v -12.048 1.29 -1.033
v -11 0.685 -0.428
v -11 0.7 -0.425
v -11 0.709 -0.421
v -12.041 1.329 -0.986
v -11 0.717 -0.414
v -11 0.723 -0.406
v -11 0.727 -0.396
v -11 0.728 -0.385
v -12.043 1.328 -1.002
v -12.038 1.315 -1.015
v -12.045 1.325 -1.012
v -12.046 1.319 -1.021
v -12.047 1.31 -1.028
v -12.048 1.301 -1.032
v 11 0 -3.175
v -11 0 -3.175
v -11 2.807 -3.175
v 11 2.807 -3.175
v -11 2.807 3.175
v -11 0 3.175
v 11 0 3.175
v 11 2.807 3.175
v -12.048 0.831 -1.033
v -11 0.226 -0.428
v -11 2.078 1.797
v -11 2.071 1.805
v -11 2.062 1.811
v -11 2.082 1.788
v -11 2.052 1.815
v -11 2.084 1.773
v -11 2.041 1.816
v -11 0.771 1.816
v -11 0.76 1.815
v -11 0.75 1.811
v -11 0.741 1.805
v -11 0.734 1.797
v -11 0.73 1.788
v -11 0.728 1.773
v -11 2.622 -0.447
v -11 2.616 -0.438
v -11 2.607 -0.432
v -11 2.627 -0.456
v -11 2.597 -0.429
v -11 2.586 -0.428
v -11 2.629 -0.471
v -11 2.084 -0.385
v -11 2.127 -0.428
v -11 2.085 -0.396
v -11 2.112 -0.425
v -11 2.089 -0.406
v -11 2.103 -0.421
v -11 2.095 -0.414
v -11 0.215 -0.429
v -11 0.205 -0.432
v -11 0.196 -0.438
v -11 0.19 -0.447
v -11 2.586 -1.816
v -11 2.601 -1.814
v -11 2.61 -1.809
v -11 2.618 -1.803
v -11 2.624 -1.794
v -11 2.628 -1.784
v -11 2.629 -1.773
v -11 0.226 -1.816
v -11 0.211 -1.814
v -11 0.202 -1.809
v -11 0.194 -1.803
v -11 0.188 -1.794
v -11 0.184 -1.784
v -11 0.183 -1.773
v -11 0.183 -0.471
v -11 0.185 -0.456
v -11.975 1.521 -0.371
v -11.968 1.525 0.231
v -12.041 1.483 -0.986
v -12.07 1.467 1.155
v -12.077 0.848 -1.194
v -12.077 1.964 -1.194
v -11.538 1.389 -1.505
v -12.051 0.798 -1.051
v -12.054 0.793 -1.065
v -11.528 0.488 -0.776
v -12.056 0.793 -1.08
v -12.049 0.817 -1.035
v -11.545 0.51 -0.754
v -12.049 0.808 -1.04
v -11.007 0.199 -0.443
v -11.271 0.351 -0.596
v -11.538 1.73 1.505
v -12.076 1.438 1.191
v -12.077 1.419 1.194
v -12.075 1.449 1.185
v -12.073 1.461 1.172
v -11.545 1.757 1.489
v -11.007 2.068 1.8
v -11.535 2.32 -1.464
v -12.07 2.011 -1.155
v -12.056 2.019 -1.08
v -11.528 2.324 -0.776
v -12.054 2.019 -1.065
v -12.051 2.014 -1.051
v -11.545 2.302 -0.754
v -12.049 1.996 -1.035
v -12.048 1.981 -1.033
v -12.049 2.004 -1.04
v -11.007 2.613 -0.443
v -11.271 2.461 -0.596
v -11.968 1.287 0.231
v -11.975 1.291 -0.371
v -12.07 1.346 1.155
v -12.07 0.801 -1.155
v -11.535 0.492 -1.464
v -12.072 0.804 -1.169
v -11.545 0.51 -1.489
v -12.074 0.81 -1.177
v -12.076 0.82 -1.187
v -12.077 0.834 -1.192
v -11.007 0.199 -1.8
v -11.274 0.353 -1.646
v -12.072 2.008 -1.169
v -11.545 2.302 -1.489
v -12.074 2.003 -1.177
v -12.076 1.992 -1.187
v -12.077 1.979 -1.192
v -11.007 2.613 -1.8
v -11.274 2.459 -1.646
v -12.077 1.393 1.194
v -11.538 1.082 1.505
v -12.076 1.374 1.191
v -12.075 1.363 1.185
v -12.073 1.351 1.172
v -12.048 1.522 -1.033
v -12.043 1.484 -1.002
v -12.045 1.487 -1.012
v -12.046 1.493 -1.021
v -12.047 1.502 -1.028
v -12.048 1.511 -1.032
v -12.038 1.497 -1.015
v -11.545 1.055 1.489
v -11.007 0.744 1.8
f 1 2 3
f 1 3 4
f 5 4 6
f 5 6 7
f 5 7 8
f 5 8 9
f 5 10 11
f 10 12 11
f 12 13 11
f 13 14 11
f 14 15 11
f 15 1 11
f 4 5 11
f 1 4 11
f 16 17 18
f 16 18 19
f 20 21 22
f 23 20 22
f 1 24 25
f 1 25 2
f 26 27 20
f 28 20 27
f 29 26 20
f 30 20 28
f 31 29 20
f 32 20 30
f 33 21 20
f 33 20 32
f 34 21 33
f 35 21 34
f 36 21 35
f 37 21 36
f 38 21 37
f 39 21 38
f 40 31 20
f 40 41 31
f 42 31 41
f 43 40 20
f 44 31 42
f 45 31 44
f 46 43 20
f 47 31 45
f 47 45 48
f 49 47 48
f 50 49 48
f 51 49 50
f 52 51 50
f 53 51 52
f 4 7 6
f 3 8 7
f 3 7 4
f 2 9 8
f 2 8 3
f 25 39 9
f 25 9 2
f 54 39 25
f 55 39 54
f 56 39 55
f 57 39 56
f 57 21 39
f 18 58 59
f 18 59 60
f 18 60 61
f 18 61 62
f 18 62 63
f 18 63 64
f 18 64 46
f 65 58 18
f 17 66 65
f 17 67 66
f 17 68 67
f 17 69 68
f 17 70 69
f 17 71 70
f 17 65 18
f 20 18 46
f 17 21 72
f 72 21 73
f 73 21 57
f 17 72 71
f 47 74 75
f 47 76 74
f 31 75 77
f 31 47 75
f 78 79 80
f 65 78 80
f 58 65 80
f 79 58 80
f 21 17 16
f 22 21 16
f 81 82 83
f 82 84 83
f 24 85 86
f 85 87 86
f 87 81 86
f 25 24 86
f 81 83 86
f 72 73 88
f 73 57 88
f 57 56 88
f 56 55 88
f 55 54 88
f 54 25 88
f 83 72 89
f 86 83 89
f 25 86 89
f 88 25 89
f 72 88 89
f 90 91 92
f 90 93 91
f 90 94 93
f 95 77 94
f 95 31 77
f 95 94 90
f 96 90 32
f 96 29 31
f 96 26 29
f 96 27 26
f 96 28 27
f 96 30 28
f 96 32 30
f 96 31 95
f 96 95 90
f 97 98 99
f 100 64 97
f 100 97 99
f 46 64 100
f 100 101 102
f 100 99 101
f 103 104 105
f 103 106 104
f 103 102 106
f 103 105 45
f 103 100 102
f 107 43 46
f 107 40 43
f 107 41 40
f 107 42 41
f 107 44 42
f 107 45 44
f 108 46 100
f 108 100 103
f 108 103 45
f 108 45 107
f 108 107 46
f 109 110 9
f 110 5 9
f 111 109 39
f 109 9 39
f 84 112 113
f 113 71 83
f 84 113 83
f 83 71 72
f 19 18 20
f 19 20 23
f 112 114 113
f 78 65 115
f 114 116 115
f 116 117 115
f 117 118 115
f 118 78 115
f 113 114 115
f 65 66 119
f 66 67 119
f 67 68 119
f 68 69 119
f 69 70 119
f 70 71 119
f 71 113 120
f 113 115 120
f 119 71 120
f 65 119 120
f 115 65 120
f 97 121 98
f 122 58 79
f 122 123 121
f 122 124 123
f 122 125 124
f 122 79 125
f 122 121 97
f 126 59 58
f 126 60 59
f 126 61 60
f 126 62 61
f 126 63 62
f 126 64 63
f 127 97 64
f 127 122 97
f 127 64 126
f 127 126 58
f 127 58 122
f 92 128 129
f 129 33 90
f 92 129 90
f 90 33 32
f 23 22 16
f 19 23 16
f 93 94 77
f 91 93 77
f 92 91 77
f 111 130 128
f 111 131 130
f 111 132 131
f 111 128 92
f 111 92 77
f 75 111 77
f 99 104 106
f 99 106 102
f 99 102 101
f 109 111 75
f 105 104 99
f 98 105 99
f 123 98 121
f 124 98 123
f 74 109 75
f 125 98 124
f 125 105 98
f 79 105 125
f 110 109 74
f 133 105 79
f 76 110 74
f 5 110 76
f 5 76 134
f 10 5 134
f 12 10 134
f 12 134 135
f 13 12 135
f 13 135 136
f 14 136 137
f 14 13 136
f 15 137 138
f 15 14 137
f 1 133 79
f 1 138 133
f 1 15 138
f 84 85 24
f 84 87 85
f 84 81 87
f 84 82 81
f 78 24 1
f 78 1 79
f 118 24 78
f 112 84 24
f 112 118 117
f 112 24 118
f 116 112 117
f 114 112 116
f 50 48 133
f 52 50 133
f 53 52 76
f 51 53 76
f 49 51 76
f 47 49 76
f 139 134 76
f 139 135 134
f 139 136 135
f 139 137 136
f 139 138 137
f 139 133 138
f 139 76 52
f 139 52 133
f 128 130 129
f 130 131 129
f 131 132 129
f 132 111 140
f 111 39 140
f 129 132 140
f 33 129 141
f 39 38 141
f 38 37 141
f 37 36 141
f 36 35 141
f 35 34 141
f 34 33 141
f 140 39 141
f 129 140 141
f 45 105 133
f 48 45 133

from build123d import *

# Parameters (mm, degrees)
CROQUIS1_W              = 22
CROQUIS1_H              = 6.35
SALIENTE_EXTRUIR1_DEPTH = 2.8067
SALIENTE_EXTRUIR2_DEPTH = 1.07696
SALIENTE_EXTRUIR2_TAPER = 3
REDONDEO1_R             = 0.049609375
CORTAR_EXTRUIR1_DEPTH   = 13.798873245


with BuildPart() as part:
    # Croquis1 → Saliente-Extruir1 (new body)
    with BuildSketch(Plane(origin=(0, 0, 0), x_dir=(1, 0, 0), z_dir=(0, 1, 0))):
        Rectangle(CROQUIS1_W, CROQUIS1_H)
    extrude(amount=SALIENTE_EXTRUIR1_DEPTH)

    # Croquis2 → Saliente-Extruir2 (add)
    with BuildSketch(Plane.ZY.offset(11)):
        Polygon((-0.993589744, 2.063091923), (-1.25, 2.063091923), (-1.25, 0.748989359), (-0.993589744, 0.748989359), (-0.993589744, 1.293861154), (1.25, 1.293861154), (1.25, 1.518220128), (-0.993589744, 1.518220128), align=None)
    extrude(amount=SALIENTE_EXTRUIR2_DEPTH, taper=SALIENTE_EXTRUIR2_TAPER)

    # Chaflán1: read off the stored shape, not the designer's step
    # Chaflán1: loft between two sections, ruled curve by curve
    chafl_n1_from = [
        Edge.make_line((-12.07696, 2.007207586, -1.194115663), (-12.07696, 0.804873696, -1.194115663)),
        Edge.make_line((-12.07696, 0.804873696, -1.194115663), (-12.07696, 0.804873696, -1.049474081)),
        Edge.make_line((-12.07696, 2.007207586, -1.194115663), (-12.07696, 2.007207586, -1.049474081)),
        Edge.make_line((-12.07696, 0.804873696, -1.049474081), (-12.07696, 1.349745491, -1.049474081)),
        Edge.make_line((-12.07696, 2.007207586, -1.049474081), (-12.07696, 1.462335791, -1.049474081)),
        Edge.make_line((-12.07696, 1.349745491, -1.049474081), (-12.07696, 1.349745491, 1.194115663)),
        Edge.make_line((-12.07696, 1.462335791, -1.049474081), (-12.07696, 1.462335791, 1.194115663)),
        Edge.make_line((-12.07696, 1.349745491, 1.194115663), (-12.07696, 1.462335791, 1.194115663)),
    ]
    chafl_n1_to = [
        Edge.make_line((-11, 2.628990732, -1.815898809), (-11, 0.18309055, -1.815898809)),
        Edge.make_line((-11, 0.18309055, -1.815898809), (-11, 0.18309055, -0.427690935)),
        Edge.make_line((-11, 2.628990732, -1.815898809), (-11, 2.628990732, -0.427690935)),
        Edge.make_line((-11, 0.18309055, -0.427690935), (-11, 0.727962345, -0.427690935)),
        Edge.make_line((-11, 2.628990732, -0.427690935), (-11, 2.084118937, -0.427690935)),
        Edge.make_line((-11, 0.727962345, -0.427690935), (-11, 0.727962345, 1.815898809)),
        Edge.make_line((-11, 2.084118937, -0.427690935), (-11, 2.084118937, 1.815898809)),
        Edge.make_line((-11, 0.727962345, 1.815898809), (-11, 2.084118937, 1.815898809)),
    ]
    chafl_n1 = Solid(Shell([*[Face.make_surface_from_curves(chafl_n1_from[k], chafl_n1_to[k]) for k in range(8)], Face(Wire(chafl_n1_from)), Face(Wire(chafl_n1_to))]))
    add(chafl_n1)

    # Redondeo1
    redondeo1_edges = [part.edges().sort_by_distance(p)[0] for p in [
        (-11.53848, 0.493982123, -1.505007236),
        (-11.53848, 2.318099159, -1.505007236),
        (-11.53848, 0.493982123, -0.738582508),
        (-11.53848, 2.318099159, -0.738582508),
        (-11.53848, 1.038853918, -0.738582508),
        (-11.53848, 1.773227364, -0.738582508),
        (-11.53848, 1.038853918, 1.505007236),
        (-11.53848, 1.773227364, 1.505007236),
    ]]
    fillet(redondeo1_edges, radius=REDONDEO1_R)

    # Croquis5 → Cortar-Extruir1 (cut, through all)
    with BuildSketch(Plane.XZ):
        with BuildLine():
            Line((-12.07696, -1.194115663), (-12.07696, 1.194115663))
            ThreePointArc((-12.07696, 1.194115663), (-11.963672899, 0), (-12.07696, -1.194115663))
        make_face()
    extrude(amount=-CORTAR_EXTRUIR1_DEPTH, mode=Mode.SUBTRACT)


solid = part.part
